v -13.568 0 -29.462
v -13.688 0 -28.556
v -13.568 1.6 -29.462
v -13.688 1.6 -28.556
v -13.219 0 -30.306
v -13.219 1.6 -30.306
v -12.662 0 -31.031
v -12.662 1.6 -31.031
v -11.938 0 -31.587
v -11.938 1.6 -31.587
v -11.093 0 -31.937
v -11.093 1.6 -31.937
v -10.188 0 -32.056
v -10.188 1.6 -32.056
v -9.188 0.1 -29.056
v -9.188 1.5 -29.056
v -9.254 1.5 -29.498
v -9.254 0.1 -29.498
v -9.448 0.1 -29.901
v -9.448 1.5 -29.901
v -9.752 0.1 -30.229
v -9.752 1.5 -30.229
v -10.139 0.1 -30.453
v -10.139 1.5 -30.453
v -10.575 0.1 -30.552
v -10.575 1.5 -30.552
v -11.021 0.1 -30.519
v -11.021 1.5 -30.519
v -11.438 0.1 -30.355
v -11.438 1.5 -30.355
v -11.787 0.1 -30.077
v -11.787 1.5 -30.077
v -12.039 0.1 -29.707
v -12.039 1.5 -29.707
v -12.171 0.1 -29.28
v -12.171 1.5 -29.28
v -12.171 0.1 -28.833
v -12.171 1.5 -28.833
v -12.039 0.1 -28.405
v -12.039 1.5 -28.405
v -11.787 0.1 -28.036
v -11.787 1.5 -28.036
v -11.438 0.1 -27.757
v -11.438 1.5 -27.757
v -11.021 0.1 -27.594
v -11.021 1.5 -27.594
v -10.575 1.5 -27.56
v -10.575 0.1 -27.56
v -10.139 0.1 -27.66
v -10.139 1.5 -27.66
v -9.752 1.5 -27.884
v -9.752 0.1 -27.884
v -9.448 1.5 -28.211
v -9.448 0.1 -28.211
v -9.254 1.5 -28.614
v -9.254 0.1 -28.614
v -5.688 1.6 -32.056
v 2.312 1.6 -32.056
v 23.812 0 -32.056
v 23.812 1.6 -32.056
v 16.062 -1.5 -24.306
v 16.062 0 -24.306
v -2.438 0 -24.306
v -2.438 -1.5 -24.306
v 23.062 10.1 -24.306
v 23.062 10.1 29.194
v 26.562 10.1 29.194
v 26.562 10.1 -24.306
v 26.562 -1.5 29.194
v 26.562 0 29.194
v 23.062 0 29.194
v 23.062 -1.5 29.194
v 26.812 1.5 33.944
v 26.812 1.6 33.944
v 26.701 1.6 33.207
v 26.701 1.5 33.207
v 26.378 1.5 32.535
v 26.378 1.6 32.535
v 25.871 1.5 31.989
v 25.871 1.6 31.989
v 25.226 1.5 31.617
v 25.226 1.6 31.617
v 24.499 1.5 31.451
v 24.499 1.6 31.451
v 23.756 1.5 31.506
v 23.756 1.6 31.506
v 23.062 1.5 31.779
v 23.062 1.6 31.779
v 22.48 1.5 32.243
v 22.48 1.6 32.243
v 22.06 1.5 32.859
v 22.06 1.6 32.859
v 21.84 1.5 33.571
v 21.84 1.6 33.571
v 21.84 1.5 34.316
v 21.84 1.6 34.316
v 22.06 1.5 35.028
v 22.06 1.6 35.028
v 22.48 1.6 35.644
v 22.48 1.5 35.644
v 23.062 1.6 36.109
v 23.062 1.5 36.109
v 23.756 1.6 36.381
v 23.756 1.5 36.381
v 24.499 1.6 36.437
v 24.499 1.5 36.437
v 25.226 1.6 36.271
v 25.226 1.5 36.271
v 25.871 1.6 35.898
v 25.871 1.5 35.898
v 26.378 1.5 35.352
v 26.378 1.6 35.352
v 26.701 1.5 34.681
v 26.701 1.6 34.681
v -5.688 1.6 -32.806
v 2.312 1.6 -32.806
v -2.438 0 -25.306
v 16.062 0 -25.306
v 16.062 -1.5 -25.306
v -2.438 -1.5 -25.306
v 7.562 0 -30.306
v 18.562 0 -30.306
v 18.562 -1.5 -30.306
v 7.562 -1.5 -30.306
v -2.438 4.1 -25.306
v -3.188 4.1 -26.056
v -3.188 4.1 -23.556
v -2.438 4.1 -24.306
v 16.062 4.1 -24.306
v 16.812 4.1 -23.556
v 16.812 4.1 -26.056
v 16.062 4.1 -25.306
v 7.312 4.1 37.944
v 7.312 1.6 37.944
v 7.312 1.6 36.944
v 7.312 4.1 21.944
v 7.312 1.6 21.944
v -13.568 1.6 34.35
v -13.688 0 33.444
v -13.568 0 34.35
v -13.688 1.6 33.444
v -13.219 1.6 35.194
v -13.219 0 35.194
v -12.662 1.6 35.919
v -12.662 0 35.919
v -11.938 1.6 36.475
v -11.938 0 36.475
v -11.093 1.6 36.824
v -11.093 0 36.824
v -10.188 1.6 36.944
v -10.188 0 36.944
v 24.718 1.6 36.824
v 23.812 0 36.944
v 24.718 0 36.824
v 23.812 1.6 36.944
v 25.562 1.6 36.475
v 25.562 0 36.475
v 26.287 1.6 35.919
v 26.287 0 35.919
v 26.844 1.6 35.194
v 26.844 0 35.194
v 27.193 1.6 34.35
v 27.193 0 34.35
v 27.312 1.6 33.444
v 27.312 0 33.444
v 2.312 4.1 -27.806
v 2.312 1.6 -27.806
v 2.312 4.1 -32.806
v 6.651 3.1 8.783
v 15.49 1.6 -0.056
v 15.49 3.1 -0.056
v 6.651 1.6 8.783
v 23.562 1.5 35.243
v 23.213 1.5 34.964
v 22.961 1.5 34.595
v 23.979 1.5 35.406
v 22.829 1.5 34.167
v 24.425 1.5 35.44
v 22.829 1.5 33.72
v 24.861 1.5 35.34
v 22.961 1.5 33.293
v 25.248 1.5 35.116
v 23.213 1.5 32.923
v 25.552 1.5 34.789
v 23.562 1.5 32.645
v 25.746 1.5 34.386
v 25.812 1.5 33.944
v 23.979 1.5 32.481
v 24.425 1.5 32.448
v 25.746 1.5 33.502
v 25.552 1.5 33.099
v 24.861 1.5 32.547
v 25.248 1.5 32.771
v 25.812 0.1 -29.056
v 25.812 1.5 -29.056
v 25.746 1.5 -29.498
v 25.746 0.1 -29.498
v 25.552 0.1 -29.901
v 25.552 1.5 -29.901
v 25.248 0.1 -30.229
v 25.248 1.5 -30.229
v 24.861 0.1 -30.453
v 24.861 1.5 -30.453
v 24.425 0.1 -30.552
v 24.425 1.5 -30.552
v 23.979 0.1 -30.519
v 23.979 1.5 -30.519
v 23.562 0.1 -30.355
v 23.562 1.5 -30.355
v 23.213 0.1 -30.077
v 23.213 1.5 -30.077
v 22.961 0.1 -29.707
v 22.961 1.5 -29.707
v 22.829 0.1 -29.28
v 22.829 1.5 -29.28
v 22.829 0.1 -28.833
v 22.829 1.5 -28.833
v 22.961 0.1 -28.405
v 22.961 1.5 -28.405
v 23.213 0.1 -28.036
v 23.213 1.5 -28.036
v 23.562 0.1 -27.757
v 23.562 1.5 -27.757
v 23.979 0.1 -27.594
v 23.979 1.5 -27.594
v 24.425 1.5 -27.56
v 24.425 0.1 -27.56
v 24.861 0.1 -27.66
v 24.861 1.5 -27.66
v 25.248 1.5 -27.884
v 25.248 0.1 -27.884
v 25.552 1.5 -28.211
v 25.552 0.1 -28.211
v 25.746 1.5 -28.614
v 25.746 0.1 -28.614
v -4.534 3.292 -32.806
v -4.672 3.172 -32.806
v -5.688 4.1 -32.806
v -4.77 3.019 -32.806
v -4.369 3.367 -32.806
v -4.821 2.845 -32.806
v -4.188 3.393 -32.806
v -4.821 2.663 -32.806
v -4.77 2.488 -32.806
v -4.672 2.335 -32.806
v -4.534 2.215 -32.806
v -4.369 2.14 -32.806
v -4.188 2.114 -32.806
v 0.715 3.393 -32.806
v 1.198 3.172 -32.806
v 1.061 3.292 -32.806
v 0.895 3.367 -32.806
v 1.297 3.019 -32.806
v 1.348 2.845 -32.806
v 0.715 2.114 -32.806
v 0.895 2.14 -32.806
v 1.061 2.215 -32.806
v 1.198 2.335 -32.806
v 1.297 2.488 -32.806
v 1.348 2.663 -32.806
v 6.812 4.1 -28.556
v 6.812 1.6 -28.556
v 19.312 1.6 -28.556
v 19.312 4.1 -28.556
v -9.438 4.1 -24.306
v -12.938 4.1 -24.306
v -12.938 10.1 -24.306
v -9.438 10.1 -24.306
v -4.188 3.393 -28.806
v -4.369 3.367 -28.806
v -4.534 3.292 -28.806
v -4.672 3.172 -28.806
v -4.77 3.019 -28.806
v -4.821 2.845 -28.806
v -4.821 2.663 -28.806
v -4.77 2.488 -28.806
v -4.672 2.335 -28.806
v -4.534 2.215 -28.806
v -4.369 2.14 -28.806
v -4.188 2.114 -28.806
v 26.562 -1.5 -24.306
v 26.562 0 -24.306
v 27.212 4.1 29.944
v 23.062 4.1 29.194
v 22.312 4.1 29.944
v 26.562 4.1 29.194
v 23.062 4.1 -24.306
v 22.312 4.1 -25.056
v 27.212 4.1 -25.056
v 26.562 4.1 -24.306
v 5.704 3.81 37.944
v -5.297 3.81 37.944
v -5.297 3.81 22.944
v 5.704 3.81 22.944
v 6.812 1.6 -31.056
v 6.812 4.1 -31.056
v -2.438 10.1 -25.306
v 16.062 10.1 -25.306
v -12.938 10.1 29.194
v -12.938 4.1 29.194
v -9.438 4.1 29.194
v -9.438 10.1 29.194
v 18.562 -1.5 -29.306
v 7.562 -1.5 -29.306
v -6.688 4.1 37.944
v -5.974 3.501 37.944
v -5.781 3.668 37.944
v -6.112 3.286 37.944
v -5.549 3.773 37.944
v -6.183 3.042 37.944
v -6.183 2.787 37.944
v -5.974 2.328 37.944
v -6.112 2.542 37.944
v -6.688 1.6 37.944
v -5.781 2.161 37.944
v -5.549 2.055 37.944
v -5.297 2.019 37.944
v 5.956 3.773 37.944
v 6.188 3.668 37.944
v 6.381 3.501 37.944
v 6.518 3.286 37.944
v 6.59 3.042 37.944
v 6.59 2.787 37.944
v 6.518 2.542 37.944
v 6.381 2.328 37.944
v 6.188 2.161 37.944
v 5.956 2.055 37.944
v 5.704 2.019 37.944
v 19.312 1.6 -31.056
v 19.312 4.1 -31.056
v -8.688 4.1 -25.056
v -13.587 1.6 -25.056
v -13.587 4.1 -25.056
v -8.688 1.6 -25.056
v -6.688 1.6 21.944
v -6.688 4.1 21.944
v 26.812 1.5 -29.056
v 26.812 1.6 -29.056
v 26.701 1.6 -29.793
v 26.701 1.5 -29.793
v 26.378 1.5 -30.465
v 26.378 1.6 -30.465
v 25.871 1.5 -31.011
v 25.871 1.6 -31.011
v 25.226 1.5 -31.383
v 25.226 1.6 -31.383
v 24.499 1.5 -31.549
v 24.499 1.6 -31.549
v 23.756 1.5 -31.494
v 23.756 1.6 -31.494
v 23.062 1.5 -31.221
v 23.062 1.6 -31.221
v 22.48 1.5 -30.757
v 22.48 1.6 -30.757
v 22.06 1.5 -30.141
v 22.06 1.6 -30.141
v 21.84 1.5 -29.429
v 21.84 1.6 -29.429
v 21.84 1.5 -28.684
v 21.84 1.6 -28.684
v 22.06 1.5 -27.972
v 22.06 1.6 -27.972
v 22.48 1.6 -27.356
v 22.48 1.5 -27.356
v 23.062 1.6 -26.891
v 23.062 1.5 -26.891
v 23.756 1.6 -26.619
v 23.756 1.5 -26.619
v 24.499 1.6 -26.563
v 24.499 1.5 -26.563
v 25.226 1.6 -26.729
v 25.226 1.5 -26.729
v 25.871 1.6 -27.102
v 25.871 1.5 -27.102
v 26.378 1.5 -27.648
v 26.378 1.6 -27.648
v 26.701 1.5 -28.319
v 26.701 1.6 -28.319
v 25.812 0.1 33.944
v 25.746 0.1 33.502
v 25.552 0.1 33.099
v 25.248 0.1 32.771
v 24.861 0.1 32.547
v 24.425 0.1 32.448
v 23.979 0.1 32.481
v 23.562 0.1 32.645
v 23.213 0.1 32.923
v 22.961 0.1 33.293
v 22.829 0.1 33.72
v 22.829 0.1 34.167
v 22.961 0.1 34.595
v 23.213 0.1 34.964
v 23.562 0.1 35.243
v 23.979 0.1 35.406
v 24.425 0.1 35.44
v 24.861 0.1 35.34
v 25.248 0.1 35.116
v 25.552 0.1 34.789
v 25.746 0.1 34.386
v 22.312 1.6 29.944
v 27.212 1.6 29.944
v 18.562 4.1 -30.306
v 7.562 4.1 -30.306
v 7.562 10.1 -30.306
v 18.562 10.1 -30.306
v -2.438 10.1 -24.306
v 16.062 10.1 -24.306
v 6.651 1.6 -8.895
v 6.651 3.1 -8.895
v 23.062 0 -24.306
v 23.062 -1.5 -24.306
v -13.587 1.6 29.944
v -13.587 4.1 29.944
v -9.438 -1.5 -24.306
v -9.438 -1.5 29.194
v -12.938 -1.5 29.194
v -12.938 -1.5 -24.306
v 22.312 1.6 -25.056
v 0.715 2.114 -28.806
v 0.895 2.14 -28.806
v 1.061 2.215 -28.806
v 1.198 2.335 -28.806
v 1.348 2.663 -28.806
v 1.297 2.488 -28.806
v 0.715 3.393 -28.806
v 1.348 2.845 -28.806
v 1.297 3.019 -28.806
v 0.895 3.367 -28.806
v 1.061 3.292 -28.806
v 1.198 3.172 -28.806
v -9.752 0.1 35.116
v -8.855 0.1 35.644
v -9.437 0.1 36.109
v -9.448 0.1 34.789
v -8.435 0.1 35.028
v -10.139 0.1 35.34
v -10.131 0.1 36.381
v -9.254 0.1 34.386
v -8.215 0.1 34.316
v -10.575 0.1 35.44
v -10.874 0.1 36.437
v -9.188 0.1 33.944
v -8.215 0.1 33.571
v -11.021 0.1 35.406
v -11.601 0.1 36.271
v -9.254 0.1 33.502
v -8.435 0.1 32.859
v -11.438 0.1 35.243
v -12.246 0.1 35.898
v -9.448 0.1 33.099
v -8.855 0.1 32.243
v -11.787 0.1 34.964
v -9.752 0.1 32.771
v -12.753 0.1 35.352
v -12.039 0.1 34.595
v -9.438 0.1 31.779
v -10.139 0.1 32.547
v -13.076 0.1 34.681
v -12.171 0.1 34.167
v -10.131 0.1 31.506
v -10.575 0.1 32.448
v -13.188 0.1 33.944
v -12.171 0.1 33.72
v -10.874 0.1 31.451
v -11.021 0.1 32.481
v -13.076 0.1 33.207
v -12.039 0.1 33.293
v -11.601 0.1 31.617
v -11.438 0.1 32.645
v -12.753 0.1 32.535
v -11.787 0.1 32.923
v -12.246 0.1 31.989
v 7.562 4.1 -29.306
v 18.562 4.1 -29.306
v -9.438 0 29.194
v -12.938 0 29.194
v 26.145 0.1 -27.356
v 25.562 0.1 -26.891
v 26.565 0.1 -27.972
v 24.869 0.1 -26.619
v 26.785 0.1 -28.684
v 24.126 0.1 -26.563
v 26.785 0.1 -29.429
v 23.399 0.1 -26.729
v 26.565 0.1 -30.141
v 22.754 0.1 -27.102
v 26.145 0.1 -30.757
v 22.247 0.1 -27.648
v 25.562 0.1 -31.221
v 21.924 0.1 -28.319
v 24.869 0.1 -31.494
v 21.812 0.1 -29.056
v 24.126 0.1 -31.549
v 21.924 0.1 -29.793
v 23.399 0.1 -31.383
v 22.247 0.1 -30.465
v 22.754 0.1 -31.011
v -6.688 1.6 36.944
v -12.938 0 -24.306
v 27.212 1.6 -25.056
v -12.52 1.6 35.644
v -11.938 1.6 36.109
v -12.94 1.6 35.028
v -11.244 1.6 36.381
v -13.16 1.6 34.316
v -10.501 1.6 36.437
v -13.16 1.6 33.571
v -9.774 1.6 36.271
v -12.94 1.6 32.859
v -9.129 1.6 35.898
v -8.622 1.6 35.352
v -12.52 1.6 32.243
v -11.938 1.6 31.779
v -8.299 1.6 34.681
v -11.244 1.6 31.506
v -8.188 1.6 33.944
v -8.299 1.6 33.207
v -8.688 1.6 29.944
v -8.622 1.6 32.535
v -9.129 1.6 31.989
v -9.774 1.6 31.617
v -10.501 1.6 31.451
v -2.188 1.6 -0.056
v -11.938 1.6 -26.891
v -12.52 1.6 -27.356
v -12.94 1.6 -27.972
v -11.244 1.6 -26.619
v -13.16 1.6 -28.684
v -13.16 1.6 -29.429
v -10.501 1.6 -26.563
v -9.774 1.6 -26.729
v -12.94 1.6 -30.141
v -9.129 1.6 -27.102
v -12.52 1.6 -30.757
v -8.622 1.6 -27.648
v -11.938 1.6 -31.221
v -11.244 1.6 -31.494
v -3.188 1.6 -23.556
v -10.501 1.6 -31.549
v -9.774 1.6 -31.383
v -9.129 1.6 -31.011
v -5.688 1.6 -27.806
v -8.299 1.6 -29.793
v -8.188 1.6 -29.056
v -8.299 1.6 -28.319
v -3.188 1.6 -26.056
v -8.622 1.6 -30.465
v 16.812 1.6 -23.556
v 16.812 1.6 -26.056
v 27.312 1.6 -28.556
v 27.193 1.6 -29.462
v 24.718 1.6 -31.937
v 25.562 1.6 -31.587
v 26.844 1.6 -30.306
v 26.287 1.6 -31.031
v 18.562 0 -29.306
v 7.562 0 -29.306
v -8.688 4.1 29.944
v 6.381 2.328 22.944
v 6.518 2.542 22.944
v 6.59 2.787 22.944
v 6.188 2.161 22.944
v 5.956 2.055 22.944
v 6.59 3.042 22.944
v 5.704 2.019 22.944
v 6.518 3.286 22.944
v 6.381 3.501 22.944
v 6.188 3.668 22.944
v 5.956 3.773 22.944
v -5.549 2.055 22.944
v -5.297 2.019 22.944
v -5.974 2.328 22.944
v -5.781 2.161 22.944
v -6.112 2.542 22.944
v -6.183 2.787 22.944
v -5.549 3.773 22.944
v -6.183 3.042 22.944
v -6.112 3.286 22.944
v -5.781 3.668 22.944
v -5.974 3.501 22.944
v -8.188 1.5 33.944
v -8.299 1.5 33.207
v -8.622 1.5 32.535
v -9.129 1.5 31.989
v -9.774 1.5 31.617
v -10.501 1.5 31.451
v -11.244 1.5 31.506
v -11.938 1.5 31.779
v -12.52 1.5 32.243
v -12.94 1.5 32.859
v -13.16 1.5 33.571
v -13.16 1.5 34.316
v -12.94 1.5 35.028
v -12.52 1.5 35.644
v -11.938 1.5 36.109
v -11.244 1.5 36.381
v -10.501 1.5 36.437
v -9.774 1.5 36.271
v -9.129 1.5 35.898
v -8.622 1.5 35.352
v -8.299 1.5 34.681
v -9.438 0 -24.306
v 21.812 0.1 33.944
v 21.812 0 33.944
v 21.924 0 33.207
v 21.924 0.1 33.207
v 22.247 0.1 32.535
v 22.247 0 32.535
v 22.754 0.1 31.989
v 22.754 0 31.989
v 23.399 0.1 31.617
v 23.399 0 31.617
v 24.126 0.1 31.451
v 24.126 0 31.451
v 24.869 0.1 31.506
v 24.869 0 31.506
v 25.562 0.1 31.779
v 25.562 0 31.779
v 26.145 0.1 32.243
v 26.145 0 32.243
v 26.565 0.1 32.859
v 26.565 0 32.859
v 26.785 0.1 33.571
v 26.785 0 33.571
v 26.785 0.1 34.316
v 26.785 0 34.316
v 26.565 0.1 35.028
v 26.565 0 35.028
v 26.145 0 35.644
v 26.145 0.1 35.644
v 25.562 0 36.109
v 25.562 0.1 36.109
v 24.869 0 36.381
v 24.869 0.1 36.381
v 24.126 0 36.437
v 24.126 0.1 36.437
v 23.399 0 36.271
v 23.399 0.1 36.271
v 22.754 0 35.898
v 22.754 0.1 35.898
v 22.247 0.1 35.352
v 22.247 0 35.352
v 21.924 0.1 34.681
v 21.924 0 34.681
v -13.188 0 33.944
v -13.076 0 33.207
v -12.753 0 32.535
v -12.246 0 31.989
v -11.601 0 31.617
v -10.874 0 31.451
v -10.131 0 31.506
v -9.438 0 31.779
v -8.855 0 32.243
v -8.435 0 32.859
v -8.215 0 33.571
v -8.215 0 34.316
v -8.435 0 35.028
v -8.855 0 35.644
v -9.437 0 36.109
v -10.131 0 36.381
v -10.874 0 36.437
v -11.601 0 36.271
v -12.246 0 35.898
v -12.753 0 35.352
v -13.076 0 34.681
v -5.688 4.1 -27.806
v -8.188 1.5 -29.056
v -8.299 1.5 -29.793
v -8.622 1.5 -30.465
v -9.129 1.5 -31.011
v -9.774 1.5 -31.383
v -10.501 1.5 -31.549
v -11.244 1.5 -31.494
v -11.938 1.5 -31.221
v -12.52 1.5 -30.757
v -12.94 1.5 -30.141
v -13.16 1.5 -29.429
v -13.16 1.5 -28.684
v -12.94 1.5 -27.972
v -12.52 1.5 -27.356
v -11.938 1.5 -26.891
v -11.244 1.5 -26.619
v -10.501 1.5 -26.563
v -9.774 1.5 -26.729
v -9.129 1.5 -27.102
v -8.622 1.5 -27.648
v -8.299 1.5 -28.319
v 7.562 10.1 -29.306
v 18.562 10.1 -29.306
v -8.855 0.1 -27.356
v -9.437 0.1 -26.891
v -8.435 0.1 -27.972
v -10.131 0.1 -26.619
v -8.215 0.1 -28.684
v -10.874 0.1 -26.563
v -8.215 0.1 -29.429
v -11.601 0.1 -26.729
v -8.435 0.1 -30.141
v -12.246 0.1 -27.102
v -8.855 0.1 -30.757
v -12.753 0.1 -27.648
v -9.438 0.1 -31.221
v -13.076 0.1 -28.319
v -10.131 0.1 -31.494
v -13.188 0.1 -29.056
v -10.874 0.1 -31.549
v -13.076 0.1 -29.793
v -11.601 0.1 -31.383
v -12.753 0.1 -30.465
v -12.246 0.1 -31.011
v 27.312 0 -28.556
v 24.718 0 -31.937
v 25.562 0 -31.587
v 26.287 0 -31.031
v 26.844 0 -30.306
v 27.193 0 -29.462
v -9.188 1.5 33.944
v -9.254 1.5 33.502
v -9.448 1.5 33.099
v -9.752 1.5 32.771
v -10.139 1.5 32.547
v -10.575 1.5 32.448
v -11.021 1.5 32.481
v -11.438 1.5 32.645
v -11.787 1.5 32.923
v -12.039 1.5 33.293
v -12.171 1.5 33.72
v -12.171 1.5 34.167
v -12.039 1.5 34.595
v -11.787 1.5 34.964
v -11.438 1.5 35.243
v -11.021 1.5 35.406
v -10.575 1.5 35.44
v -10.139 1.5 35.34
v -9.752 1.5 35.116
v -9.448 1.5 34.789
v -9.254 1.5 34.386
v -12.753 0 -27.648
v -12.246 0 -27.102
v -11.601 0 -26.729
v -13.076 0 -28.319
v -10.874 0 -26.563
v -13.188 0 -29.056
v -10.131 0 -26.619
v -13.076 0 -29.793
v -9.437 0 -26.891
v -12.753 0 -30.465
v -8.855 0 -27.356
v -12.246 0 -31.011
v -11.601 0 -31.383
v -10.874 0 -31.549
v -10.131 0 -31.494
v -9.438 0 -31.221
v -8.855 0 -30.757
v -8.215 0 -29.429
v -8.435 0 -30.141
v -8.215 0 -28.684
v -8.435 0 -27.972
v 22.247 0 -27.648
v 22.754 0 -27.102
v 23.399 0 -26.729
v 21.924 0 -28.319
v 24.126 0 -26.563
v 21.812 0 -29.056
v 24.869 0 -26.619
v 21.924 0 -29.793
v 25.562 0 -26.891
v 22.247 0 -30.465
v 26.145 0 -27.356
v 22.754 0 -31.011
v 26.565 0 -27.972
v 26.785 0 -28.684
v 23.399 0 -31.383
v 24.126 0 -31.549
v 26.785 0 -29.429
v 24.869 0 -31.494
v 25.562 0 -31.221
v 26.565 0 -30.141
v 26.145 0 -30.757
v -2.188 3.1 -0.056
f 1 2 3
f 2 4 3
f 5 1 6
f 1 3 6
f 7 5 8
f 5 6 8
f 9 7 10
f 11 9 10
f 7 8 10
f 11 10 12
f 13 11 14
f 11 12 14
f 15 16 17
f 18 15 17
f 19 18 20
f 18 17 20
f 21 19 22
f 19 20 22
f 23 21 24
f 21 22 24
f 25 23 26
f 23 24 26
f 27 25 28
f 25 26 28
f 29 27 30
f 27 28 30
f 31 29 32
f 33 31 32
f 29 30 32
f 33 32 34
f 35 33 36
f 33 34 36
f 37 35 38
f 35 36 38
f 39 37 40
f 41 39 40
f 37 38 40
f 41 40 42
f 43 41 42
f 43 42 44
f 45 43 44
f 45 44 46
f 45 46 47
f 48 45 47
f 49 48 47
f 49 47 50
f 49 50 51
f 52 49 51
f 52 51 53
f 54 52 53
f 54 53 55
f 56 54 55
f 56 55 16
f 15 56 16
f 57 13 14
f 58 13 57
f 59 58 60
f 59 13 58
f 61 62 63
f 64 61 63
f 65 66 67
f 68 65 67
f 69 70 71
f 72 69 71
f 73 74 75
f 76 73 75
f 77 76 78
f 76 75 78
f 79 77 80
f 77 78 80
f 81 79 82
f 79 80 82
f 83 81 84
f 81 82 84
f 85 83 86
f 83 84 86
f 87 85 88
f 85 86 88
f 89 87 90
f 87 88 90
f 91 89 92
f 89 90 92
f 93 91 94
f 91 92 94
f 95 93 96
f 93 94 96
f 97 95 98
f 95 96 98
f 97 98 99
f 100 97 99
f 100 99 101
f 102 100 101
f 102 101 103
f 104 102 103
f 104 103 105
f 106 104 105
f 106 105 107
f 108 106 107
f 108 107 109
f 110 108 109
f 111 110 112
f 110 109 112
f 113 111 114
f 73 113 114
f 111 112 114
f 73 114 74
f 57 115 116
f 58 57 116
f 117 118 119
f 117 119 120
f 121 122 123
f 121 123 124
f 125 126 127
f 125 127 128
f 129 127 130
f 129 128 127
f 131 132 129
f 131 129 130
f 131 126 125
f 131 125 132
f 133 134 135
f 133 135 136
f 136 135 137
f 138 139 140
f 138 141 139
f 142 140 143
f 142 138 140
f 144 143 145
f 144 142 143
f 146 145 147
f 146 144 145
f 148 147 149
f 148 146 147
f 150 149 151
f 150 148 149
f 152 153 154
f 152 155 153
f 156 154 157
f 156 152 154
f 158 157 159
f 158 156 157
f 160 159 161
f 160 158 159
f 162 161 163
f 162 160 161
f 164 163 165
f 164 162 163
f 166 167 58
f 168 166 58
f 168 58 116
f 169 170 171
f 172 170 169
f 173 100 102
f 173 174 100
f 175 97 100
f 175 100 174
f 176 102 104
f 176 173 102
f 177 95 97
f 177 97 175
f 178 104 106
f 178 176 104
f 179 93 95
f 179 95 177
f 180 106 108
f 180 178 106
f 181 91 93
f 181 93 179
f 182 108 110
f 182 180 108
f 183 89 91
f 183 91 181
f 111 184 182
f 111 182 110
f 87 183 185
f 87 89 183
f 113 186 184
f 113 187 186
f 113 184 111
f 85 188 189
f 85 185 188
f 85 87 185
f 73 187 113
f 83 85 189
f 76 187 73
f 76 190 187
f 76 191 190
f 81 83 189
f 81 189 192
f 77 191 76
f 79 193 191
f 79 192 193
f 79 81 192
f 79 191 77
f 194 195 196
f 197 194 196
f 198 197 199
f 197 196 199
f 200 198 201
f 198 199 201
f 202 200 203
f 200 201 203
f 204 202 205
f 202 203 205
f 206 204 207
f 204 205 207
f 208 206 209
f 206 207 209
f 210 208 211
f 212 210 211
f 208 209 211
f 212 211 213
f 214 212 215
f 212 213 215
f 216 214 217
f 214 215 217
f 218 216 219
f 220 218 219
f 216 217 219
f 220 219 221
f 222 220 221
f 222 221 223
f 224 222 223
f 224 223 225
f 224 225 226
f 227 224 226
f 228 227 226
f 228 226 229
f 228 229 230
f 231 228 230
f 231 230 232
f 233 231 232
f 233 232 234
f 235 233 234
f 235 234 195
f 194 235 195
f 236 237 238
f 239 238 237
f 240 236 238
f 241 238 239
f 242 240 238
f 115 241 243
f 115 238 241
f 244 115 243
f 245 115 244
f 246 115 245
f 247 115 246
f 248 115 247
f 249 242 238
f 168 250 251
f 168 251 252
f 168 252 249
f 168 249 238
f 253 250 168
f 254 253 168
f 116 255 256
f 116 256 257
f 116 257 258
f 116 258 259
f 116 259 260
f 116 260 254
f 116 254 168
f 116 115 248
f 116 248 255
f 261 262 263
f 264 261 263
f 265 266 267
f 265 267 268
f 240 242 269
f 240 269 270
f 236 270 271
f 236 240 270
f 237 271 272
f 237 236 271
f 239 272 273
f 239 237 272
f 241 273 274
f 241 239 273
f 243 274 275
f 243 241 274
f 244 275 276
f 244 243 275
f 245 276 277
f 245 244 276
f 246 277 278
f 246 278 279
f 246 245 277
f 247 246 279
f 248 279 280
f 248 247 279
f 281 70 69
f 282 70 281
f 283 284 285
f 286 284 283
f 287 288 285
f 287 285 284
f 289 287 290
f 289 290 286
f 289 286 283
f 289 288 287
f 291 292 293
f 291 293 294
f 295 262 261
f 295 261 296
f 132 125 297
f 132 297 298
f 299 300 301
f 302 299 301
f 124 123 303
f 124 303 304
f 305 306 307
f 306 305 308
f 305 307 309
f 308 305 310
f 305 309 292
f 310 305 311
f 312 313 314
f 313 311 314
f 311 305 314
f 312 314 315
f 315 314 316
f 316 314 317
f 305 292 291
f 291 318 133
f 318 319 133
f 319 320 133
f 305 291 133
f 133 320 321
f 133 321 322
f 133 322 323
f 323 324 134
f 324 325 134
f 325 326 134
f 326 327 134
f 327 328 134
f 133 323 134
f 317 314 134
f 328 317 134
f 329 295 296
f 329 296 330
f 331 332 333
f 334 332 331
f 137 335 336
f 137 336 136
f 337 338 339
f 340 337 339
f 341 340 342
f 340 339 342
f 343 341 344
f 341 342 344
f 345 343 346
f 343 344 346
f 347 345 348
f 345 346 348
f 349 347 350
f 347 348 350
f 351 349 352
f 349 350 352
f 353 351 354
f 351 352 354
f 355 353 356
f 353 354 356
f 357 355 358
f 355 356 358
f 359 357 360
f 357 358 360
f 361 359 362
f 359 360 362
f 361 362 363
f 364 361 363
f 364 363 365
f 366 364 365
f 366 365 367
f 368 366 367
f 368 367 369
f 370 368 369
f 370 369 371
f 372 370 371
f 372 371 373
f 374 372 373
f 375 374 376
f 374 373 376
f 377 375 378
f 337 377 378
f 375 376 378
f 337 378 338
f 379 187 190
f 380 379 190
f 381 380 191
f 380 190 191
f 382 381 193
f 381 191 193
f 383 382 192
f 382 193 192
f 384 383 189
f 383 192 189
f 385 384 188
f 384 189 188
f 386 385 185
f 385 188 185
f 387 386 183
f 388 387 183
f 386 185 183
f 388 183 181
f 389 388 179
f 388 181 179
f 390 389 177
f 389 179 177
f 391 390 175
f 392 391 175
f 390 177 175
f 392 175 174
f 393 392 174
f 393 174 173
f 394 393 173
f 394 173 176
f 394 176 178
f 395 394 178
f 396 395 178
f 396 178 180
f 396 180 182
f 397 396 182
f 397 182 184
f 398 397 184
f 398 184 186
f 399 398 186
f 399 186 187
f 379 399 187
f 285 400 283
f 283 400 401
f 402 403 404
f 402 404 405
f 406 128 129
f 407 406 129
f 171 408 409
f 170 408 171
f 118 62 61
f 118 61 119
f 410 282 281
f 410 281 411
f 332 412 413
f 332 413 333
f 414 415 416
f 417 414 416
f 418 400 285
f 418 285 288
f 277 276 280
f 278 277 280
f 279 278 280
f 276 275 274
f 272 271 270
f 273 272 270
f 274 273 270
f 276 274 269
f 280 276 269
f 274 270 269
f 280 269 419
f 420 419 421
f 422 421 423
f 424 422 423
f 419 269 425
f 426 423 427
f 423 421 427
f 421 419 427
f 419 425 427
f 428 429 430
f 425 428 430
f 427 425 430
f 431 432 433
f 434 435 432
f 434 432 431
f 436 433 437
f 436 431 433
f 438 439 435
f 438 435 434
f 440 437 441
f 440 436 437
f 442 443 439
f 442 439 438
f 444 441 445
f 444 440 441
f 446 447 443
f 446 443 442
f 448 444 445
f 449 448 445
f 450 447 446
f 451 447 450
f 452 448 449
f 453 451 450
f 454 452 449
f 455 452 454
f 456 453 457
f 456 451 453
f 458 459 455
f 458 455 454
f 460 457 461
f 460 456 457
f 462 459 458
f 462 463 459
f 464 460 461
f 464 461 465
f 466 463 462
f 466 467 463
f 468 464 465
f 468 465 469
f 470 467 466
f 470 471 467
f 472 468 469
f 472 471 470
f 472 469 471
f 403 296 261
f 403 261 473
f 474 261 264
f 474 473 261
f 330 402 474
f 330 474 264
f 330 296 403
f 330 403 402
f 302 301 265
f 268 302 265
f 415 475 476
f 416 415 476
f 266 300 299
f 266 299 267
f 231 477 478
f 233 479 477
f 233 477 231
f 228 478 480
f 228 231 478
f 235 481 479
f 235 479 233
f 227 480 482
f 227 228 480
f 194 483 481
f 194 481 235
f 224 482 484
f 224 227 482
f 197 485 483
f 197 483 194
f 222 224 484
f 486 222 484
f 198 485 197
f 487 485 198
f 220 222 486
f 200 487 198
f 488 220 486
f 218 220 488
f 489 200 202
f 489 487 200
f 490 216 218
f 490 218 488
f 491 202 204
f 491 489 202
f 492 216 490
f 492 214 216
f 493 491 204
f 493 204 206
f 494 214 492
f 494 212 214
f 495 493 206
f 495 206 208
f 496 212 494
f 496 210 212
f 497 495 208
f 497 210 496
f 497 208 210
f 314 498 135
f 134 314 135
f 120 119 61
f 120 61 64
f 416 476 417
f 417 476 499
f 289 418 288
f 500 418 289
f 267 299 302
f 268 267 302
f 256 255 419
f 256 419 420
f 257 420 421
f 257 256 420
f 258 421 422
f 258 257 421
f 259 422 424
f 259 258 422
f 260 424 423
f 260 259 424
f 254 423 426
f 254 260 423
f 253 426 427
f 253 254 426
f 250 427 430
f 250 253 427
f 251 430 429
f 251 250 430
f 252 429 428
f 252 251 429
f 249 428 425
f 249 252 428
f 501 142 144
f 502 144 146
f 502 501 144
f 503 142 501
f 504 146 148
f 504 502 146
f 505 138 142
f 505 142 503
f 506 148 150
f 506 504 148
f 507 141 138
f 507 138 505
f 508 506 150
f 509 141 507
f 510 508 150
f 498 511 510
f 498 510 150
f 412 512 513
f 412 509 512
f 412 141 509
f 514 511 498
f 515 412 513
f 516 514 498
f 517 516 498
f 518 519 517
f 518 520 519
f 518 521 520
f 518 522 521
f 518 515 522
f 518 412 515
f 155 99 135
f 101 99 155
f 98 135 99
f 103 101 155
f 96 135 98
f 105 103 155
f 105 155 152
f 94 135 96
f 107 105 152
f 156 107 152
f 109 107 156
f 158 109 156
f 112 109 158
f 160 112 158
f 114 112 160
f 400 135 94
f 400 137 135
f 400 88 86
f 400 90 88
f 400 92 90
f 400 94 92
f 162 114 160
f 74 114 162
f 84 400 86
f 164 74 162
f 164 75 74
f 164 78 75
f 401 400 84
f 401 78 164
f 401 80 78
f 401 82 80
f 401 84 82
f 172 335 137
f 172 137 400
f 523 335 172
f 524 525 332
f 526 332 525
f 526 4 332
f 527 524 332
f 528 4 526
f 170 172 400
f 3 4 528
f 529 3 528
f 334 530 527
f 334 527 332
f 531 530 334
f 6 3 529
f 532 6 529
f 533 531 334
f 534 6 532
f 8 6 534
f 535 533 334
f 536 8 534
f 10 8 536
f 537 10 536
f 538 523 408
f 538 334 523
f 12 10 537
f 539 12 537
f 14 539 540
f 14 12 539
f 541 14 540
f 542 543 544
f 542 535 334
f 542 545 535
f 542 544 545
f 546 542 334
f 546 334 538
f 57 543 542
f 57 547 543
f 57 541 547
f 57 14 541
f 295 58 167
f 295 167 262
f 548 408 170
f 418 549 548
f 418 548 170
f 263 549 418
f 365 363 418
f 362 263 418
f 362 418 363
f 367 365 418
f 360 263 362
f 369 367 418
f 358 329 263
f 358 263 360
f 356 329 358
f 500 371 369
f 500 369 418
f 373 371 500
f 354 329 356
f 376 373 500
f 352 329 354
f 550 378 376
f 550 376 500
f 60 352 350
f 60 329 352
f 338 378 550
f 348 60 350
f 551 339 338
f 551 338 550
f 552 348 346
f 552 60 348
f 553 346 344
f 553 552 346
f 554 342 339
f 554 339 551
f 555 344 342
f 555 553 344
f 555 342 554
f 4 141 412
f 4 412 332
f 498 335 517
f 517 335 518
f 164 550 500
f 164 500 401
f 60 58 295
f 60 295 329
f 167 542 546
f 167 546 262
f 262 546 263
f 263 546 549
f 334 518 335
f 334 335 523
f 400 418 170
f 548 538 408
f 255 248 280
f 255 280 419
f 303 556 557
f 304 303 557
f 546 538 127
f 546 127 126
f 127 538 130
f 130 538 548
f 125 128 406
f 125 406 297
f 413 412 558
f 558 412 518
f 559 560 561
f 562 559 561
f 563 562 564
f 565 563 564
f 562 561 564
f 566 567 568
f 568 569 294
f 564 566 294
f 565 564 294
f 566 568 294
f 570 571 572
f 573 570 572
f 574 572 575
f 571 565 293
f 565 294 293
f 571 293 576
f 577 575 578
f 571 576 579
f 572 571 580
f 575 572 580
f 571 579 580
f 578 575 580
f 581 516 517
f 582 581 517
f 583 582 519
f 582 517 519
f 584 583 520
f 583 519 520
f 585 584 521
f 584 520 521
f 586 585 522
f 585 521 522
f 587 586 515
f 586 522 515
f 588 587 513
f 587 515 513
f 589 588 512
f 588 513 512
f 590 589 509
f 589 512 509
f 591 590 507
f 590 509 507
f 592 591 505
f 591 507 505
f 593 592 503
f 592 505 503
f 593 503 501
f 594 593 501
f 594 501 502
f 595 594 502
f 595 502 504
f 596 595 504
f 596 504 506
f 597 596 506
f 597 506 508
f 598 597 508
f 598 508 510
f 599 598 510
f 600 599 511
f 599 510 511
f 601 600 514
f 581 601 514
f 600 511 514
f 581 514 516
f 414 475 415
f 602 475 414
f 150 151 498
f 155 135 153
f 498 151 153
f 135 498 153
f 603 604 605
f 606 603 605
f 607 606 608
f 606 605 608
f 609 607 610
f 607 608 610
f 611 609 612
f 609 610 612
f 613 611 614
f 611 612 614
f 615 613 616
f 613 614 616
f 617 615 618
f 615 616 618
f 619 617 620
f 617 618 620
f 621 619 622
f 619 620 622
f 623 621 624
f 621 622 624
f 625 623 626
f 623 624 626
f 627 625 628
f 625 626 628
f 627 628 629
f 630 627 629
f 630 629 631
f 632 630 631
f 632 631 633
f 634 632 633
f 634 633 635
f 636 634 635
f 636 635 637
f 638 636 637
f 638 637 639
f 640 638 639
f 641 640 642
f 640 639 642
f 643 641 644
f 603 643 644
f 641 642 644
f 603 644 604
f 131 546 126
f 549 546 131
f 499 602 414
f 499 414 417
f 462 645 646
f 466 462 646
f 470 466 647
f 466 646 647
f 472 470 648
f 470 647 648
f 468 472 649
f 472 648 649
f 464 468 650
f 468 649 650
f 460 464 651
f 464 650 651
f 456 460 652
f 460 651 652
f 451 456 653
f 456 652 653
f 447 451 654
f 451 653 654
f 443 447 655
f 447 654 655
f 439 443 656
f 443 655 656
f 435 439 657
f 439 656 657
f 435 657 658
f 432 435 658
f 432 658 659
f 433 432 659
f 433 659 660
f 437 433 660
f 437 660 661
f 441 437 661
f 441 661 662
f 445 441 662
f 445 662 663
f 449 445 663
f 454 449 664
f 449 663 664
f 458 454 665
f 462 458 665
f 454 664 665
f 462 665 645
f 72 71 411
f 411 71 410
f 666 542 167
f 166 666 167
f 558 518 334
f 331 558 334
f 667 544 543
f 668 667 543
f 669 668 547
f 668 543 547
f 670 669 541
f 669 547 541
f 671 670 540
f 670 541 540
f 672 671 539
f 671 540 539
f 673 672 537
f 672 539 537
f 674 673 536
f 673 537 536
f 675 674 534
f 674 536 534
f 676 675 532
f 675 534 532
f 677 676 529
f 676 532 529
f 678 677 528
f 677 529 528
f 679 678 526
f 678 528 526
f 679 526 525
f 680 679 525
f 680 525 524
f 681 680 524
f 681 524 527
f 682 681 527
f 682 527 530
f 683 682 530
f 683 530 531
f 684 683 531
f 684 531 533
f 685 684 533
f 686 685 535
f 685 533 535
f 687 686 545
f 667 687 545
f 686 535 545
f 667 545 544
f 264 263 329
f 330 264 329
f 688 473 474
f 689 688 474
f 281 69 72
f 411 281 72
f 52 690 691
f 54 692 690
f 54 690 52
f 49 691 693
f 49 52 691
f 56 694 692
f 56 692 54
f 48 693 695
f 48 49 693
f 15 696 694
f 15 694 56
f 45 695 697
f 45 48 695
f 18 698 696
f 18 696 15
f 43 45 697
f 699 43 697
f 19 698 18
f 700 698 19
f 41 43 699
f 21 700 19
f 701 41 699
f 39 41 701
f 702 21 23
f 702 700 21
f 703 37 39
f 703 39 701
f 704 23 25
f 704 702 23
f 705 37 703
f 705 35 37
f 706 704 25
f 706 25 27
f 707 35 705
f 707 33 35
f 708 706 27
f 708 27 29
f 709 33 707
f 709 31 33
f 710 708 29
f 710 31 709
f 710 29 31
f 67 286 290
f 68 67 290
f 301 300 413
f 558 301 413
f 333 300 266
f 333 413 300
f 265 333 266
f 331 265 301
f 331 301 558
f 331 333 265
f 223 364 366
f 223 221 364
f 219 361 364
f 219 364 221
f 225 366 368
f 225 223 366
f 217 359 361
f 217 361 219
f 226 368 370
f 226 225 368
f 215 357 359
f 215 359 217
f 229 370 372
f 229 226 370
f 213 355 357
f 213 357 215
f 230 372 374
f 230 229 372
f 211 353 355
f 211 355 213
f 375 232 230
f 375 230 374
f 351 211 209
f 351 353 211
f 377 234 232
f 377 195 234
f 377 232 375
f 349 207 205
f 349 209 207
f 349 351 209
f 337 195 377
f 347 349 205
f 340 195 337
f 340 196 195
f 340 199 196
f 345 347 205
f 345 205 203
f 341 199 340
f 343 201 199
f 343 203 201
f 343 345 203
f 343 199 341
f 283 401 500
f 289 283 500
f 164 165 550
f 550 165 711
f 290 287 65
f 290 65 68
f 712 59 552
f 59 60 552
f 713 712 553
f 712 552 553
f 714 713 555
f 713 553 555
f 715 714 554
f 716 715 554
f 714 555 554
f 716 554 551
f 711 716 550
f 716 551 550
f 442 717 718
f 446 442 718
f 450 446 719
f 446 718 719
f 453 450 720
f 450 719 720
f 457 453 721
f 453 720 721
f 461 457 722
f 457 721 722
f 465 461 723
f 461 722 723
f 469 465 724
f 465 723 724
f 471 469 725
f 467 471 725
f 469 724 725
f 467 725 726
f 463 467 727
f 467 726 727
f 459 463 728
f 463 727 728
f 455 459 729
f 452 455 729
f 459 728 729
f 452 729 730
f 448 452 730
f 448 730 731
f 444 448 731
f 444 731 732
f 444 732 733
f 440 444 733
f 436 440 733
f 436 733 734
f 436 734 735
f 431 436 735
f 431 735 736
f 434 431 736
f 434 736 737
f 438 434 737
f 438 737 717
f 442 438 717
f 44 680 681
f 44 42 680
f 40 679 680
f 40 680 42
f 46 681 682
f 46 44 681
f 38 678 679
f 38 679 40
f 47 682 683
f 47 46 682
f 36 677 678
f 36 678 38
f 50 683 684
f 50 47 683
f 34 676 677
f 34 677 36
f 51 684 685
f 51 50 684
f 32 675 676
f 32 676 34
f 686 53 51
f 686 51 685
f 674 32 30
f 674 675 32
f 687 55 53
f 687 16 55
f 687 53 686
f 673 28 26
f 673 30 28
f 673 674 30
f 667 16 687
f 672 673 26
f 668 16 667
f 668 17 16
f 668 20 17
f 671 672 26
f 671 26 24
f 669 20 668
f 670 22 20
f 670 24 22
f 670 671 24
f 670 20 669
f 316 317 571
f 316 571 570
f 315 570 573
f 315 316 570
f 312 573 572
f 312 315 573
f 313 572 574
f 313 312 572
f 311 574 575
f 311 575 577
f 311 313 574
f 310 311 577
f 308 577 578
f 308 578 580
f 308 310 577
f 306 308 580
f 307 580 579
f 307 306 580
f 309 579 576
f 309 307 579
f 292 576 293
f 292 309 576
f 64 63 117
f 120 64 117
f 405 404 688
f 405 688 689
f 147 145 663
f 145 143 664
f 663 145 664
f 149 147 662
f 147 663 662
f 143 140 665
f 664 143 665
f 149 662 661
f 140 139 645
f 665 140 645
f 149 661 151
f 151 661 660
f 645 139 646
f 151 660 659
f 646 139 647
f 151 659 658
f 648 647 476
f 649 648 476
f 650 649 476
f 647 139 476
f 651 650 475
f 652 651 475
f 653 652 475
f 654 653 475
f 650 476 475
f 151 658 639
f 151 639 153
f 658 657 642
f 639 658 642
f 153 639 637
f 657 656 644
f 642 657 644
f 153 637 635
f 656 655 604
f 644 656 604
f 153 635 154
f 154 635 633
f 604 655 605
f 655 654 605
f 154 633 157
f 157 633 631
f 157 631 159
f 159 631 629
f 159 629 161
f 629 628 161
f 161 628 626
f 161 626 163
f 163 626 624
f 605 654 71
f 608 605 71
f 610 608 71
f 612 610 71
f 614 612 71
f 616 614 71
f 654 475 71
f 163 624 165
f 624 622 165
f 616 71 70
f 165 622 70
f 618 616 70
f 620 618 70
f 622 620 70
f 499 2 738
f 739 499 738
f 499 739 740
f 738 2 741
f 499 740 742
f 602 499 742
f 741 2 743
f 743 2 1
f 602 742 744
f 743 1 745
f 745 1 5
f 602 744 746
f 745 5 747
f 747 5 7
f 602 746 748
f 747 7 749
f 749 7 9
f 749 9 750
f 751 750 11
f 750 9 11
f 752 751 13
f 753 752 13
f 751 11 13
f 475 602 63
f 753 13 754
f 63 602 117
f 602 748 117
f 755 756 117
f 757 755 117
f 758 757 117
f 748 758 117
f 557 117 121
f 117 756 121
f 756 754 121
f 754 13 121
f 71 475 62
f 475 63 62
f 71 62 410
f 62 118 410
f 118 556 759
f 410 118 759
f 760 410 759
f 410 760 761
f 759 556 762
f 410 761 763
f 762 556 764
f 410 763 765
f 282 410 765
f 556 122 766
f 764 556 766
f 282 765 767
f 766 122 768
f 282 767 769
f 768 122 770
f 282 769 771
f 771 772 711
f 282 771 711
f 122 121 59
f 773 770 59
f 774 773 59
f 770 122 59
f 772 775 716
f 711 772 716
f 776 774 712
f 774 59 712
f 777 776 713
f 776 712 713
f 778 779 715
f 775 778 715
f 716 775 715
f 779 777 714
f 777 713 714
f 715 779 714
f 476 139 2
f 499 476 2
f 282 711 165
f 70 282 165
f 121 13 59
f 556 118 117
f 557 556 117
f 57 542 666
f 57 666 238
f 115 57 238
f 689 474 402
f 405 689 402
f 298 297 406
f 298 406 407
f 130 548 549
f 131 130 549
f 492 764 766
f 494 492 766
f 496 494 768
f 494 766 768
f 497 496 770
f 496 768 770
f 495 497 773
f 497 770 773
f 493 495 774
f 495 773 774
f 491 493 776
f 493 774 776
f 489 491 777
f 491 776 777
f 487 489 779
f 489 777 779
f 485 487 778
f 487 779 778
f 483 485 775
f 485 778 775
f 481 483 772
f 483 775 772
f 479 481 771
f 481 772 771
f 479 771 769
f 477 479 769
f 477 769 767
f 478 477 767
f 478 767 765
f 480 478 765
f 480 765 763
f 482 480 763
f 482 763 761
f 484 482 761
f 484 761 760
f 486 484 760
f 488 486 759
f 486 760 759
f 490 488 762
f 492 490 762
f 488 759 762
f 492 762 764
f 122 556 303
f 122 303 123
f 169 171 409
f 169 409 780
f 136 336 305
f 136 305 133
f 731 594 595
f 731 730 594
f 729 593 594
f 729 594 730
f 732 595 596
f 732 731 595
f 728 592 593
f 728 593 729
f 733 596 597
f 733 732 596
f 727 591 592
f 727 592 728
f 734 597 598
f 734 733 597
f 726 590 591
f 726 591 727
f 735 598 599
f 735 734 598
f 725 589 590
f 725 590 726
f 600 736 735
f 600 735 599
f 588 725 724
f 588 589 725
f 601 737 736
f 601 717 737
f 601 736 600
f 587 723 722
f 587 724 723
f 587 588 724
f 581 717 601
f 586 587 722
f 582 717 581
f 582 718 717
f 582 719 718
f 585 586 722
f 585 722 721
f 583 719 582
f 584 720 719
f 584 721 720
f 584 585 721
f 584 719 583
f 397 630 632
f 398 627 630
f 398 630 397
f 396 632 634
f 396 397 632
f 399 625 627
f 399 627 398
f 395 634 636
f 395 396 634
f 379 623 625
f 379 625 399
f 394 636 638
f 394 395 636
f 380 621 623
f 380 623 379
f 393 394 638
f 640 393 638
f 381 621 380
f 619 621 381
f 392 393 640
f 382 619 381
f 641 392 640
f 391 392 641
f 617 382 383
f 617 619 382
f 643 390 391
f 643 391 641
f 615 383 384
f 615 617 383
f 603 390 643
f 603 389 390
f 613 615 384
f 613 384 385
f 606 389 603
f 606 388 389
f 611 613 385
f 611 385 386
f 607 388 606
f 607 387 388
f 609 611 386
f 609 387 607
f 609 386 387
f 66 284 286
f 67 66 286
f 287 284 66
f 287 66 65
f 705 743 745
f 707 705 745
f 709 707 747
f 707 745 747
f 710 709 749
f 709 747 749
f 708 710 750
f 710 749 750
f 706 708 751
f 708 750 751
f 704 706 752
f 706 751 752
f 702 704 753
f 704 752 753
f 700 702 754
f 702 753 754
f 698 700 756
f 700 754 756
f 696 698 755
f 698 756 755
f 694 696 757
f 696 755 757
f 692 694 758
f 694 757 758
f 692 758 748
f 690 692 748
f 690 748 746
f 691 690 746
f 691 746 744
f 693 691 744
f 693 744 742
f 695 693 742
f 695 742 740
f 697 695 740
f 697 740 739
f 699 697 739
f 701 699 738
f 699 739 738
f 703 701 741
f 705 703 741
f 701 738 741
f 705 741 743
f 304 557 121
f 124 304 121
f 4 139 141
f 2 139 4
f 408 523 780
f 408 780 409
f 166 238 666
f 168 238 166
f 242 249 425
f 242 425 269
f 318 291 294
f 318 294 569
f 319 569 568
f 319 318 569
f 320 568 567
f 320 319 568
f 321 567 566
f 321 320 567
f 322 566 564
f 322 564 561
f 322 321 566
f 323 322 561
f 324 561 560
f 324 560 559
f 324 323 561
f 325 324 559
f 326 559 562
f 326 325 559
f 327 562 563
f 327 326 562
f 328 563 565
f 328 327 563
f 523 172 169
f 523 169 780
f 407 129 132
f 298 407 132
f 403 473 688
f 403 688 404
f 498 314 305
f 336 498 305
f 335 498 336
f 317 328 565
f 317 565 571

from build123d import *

# Parameters (mm, degrees)
SKETCH_1_W          = 41
SKETCH_1_H          = 69
EXTRUDE_1_DEPTH     = 1.6
SKETCH_3_R          = 2.5
CUT_EXTRUDE_1_DEPTH = 0.1
FILLET_4_R          = 3.5
SKETCH_4_R          = 1.5
CUT_EXTRUDE_2_DEPTH = 1.9
SKETCH_5_W          = 4.9
SKETCH_5_H          = 55
EXTRUDE_2_DEPTH     = 2.5
SKETCH_6_W          = 4.9
SKETCH_6_H          = 55
EXTRUDE_3_DEPTH     = 2.5
SKETCH_7_W          = 20
SKETCH_7_H          = 2.5
EXTRUDE_4_DEPTH     = 2.5
SKETCH_8_W          = 12.5
SKETCH_8_H          = 2.5
EXTRUDE_5_DEPTH     = 2.5
SKETCH_9_W          = 8
SKETCH_9_H          = 5
EXTRUDE_6_DEPTH     = 2.5
CUT_EXTRUDE_3_DEPTH = 4
EXTRUDE_7_DEPTH     = 1.5
SKETCH_12_W         = 3.5
SKETCH_12_H         = 53.5
EXTRUDE_8_DEPTH     = 6
SKETCH_13_W         = 3.5
SKETCH_13_H         = 53.5
EXTRUDE_9_DEPTH     = 6
SKETCH_14_W         = 18.5
SKETCH_14_H         = 1
EXTRUDE_10_DEPTH    = 6
SKETCH_15_W         = 11
SKETCH_15_H         = 1
EXTRUDE_11_DEPTH    = 6
SKETCH_16_W         = 3.5
SKETCH_16_H         = 53.5
SKETCH_16_W_2       = 18.5
SKETCH_16_H_2       = 1
SKETCH_16_W_3       = 11
EXTRUDE_12_DEPTH    = 1.5
SKETCH_17_R         = 2.5
CUT_EXTRUDE_4_DEPTH = 0.1
SKETCH_18_W         = 14
SKETCH_18_H         = 16
EXTRUDE_13_DEPTH    = 2.5
CUT_EXTRUDE_5_DEPTH = 15


with BuildPart() as part:
    # Эскиз1 → Бобышка-Вытянуть1 (new body)
    with BuildSketch(Plane(origin=(0, 0, 0), x_dir=(1, 0, 0), z_dir=(0, 1, 0))):
        with Locations((6.8125, -2.44375)):
            Rectangle(SKETCH_1_W, SKETCH_1_H)
    extrude(amount=EXTRUDE_1_DEPTH)

    # Эскиз3 → Вырез-Вытянуть1 (cut)
    with BuildSketch(Plane(origin=(0, 1.6, 0), x_dir=(1, 0, 0), z_dir=(0, 1, 0))):
        with Locations((-10.6875, 29.05625)):
            Circle(SKETCH_3_R)
        with Locations((24.3125, 29.05625)):
            Circle(SKETCH_3_R)
        with Locations((-10.6875, -33.94375)):
            Circle(SKETCH_3_R)
        with Locations((24.3125, -33.94375)):
            Circle(SKETCH_3_R)
    extrude(amount=-CUT_EXTRUDE_1_DEPTH, mode=Mode.SUBTRACT)

    # Скругление4
    fillet_4_edges = [part.edges().sort_by_distance(p)[0] for p in [
        (-13.6875, 0.8, -32.05625),
        (27.3125, 0.8, -32.05625),
        (27.3125, 0.8, 36.94375),
        (-13.6875, 0.8, 36.94375),
    ]]
    fillet(fillet_4_edges, radius=FILLET_4_R)

    # Эскиз4 → Вырез-Вытянуть2 (cut)
    with BuildSketch(Plane(origin=(0, 1.5, 0), x_dir=(1, 0, 0), z_dir=(0, 1, 0))):
        with Locations((-10.6875, 29.05625)):
            Circle(SKETCH_4_R)
        with Locations((24.3125, 29.05625)):
            Circle(SKETCH_4_R)
        with Locations((-10.6875, -33.94375)):
            Circle(SKETCH_4_R)
        with Locations((24.3125, -33.94375)):
            Circle(SKETCH_4_R)
    extrude(amount=-CUT_EXTRUDE_2_DEPTH, mode=Mode.SUBTRACT)

    # Эскиз5 → Бобышка-Вытянуть2 (add)
    with BuildSketch(Plane(origin=(0, 1.6, 0), x_dir=(1, 0, 0), z_dir=(0, 1, 0))):
        with Locations((-11.1375, -2.44375)):
            Rectangle(SKETCH_5_W, SKETCH_5_H)
    extrude(amount=EXTRUDE_2_DEPTH)

    # Эскиз6 → Бобышка-Вытянуть3 (add)
    with BuildSketch(Plane(origin=(0, 1.6, 0), x_dir=(1, 0, 0), z_dir=(0, 1, 0))):
        with Locations((24.7625, -2.44375)):
            Rectangle(SKETCH_6_W, SKETCH_6_H)
    extrude(amount=EXTRUDE_3_DEPTH)

    # Эскиз7 → Бобышка-Вытянуть4 (add)
    with BuildSketch(Plane(origin=(0, 1.6, 0), x_dir=(1, 0, 0), z_dir=(0, 1, 0))):
        with Locations((6.8125, 24.80625)):
            Rectangle(SKETCH_7_W, SKETCH_7_H)
    extrude(amount=EXTRUDE_4_DEPTH)

    # Эскиз8 → Бобышка-Вытянуть5 (add)
    with BuildSketch(Plane(origin=(0, 1.6, 0), x_dir=(1, 0, 0), z_dir=(0, 1, 0))):
        with Locations((13.0625, 29.80625)):
            Rectangle(SKETCH_8_W, SKETCH_8_H)
    extrude(amount=EXTRUDE_5_DEPTH)

    # Эскиз9 → Бобышка-Вытянуть6 (add)
    with BuildSketch(Plane(origin=(0, 1.6, 0), x_dir=(1, 0, 0), z_dir=(0, 1, 0))):
        with Locations((-1.6875, 30.30625)):
            Rectangle(SKETCH_9_W, SKETCH_9_H)
    extrude(amount=EXTRUDE_6_DEPTH)

    # Эскиз10 → Вырез-Вытянуть3 (cut)
    with BuildSketch(Plane(origin=(0, 0, -32.80625), x_dir=(-1, 0, 0), z_dir=(0, 0, -1))):
        with BuildLine():
            Line((-0.715104459, 3.393132584), (4.188395452, 3.393132584))
            ThreePointArc((4.188395452, 3.393132584), (4.827982397, 2.753545639), (4.188395452, 2.113958694))
            Line((4.188395452, 2.113958694), (-0.715104459, 2.113958694))
            ThreePointArc((-0.715104459, 2.113958694), (-1.354691404, 2.753545639), (-0.715104459, 3.393132584))
        make_face()
    extrude(amount=-CUT_EXTRUDE_3_DEPTH, mode=Mode.SUBTRACT)

    # Эскиз11 → Бобышка-Вытянуть7 (add)
    with BuildSketch(Plane(origin=(0, 1.6, 0), x_dir=(1, 0, 0), z_dir=(0, 1, 0))):
        Polygon((-2.1875, 0.05625), (6.651334765, 8.895084765), (15.49016953, 0.05625), (6.651334765, -8.782584765), align=None)
    extrude(amount=EXTRUDE_7_DEPTH)

    # Эскиз12 → Бобышка-Вытянуть8 (add)
    with BuildSketch(Plane(origin=(0, 4.1, 0), x_dir=(1, 0, 0), z_dir=(0, 1, 0))):
        with Locations((-11.1875, -2.44375)):
            Rectangle(SKETCH_12_W, SKETCH_12_H)
    extrude(amount=EXTRUDE_8_DEPTH)

    # Эскиз13 → Бобышка-Вытянуть9 (add)
    with BuildSketch(Plane(origin=(0, 4.1, 0), x_dir=(1, 0, 0), z_dir=(0, 1, 0))):
        with Locations((24.8125, -2.44375)):
            Rectangle(SKETCH_13_W, SKETCH_13_H)
    extrude(amount=EXTRUDE_9_DEPTH)

    # Эскиз14 → Бобышка-Вытянуть10 (add)
    with BuildSketch(Plane(origin=(0, 4.1, 0), x_dir=(1, 0, 0), z_dir=(0, 1, 0))):
        with Locations((6.8125, 24.80625)):
            Rectangle(SKETCH_14_W, SKETCH_14_H)
    extrude(amount=EXTRUDE_10_DEPTH)

    # Эскиз15 → Бобышка-Вытянуть11 (add)
    with BuildSketch(Plane(origin=(0, 4.1, 0), x_dir=(1, 0, 0), z_dir=(0, 1, 0))):
        with Locations((13.0625, 29.80625)):
            Rectangle(SKETCH_15_W, SKETCH_15_H)
    extrude(amount=EXTRUDE_11_DEPTH)

    # Эскиз16 → Бобышка-Вытянуть12 (add)
    with BuildSketch(Plane(origin=(0, 0, 0), x_dir=(-1, 0, 0), z_dir=(0, -1, 0))):
        with Locations((11.1875, -2.44375)):
            Rectangle(SKETCH_16_W, SKETCH_16_H)
        with Locations((-24.8125, -2.44375)):
            Rectangle(SKETCH_16_W, SKETCH_16_H)
        with Locations((-6.8125, 24.80625)):
            Rectangle(SKETCH_16_W_2, SKETCH_16_H_2)
        with Locations((-13.0625, 29.80625)):
            Rectangle(SKETCH_16_W_3, SKETCH_16_H_2)
    extrude(amount=EXTRUDE_12_DEPTH)

    # Эскиз17 → Вырез-Вытянуть4 (cut)
    with BuildSketch(Plane(origin=(0, 0, 0), x_dir=(-1, 0, 0), z_dir=(0, -1, 0))):
        with Locations((10.6875, -33.94375)):
            Circle(SKETCH_17_R)
        with Locations((-24.3125, -33.94375)):
            Circle(SKETCH_17_R)
        with Locations((10.6875, 29.05625)):
            Circle(SKETCH_17_R)
        with Locations((-24.3125, 29.05625)):
            Circle(SKETCH_17_R)
    extrude(amount=-CUT_EXTRUDE_4_DEPTH, mode=Mode.SUBTRACT)

    # Эскиз18 → Бобышка-Вытянуть13 (add)
    with BuildSketch(Plane(origin=(0, 1.6, 0), x_dir=(1, 0, 0), z_dir=(0, 1, 0))):
        with Locations((0.3125, -29.94375)):
            Rectangle(SKETCH_18_W, SKETCH_18_H)
    extrude(amount=EXTRUDE_13_DEPTH)

    # Эскиз19 → Вырез-Вытянуть5 (cut)
    with BuildSketch(Plane.XY.offset(37.94375)):
        with BuildLine():
            Line((-5.297012823, 3.809650009), (5.703882629, 3.809650009))
            ThreePointArc((5.703882629, 3.809650009), (6.599304352, 2.914228286), (5.703882629, 2.018806563))
            Line((5.703882629, 2.018806563), (-5.297012823, 2.018806563))
            ThreePointArc((-5.297012823, 2.018806563), (-6.192434546, 2.914228286), (-5.297012823, 3.809650009))
        make_face()
    extrude(amount=-CUT_EXTRUDE_5_DEPTH, mode=Mode.SUBTRACT)


solid = part.part
